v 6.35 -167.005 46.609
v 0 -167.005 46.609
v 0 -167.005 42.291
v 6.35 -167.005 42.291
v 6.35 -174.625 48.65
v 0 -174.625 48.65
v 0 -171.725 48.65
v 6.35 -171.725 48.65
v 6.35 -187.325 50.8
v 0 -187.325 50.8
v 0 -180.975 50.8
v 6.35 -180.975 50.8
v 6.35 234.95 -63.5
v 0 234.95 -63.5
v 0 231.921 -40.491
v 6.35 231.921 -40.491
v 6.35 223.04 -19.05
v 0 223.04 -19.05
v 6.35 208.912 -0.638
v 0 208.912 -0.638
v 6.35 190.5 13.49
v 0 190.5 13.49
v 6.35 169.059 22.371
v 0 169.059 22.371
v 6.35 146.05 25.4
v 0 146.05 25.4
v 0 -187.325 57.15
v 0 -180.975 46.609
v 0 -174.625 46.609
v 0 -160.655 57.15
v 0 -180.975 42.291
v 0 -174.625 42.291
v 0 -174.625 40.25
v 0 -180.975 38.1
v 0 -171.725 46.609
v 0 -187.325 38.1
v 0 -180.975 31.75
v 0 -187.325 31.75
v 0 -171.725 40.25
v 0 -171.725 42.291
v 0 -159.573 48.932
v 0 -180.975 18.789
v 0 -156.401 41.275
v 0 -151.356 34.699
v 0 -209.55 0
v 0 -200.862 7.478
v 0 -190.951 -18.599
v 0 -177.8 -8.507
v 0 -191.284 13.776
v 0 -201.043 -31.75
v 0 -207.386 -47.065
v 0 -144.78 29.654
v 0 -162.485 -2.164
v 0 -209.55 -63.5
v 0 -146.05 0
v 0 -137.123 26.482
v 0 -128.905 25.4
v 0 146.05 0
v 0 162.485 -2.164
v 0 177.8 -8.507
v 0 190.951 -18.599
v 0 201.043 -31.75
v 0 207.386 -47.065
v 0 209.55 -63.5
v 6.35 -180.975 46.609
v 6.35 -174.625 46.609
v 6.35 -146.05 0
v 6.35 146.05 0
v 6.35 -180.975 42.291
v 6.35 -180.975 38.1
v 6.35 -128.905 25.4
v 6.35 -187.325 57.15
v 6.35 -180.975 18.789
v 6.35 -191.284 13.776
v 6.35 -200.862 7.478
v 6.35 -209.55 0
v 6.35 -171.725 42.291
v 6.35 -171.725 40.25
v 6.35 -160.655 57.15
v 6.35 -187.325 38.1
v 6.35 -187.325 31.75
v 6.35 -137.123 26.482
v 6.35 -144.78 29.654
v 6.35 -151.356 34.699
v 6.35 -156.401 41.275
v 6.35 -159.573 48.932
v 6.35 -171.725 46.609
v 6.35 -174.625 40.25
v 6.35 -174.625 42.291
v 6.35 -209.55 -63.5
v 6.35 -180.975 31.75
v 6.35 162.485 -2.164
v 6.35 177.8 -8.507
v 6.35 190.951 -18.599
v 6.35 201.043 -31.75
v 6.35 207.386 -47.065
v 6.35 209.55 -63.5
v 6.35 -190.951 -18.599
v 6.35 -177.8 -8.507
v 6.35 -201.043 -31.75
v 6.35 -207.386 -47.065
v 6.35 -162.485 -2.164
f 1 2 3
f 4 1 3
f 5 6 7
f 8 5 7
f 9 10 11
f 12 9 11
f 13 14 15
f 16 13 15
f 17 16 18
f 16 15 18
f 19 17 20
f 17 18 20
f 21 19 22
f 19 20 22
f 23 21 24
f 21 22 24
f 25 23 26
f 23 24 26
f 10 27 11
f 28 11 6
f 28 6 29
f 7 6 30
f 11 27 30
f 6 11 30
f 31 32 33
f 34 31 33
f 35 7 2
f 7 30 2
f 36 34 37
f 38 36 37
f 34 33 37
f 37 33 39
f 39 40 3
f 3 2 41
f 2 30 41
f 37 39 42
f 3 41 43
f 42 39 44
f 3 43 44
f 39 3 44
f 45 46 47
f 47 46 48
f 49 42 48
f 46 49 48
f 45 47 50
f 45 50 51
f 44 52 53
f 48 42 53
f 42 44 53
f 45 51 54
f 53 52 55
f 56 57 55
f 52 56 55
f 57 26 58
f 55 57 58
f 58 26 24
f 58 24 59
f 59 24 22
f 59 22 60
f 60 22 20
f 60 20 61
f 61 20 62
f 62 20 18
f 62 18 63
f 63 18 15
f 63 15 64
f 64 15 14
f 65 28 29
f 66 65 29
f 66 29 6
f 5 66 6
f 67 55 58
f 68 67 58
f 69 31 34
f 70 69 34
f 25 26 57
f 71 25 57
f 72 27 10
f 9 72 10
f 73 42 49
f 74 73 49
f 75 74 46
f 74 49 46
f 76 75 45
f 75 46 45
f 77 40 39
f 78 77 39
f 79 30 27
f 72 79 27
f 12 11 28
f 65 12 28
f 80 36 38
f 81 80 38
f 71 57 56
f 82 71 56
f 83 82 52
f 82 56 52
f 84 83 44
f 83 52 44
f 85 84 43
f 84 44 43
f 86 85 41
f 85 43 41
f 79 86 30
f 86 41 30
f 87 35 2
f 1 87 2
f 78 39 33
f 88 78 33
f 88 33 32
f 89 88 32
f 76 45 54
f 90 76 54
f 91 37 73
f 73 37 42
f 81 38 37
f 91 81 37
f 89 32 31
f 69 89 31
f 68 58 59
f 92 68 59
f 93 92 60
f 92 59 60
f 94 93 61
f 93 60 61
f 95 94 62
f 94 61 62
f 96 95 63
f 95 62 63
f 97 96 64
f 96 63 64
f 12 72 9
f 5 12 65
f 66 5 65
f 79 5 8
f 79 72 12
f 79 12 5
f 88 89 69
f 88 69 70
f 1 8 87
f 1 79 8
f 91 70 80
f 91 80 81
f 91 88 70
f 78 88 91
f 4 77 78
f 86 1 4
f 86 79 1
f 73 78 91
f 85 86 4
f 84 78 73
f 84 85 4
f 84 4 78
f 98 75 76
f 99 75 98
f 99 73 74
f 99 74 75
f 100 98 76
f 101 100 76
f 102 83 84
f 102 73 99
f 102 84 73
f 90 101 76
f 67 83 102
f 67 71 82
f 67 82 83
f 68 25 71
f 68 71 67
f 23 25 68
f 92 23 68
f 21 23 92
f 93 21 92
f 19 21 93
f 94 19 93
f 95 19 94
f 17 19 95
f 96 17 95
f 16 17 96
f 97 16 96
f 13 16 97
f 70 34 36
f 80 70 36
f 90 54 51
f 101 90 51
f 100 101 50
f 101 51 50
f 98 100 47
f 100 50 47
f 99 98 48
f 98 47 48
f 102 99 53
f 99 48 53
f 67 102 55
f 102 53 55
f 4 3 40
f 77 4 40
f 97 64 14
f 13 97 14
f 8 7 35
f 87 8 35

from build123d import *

# Parameters (mm, degrees)
BOSS_EXTRUDE2_DEPTH = 6.35


with BuildPart() as part:
    # Elevator Ball Support Rail → Boss-Extrude2 (new body)
    with BuildSketch(Plane(origin=(0, 0, 0), x_dir=(0, 0, -1), z_dir=(1, 0, 0))):
        with BuildLine():
            Line((63.5, 209.55), (63.5, 234.95))
            ThreePointArc((63.5, 234.95), (0.638207153, 208.911792847), (-25.4, 146.05))
            Line((-25.4, 146.05), (-25.4, -128.905))
            ThreePointArc((-25.4, -128.905), (-34.699359697, -151.355640303), (-57.15, -160.655))
            Line((-57.15, -160.655), (-57.15, -187.325))
            Line((-57.15, -187.325), (-50.8, -187.325))
            Line((-50.8, -187.325), (-50.8, -180.975))
            Line((-50.8, -180.975), (-46.609, -180.975))
            Line((-46.609, -180.975), (-46.609, -174.625))
            Line((-46.609, -174.625), (-48.649999982, -174.625))
            Line((-48.649999982, -174.625), (-48.649999982, -171.724999958))
            Line((-48.649999982, -171.724999958), (-46.609, -171.724999958))
            Line((-46.609, -171.724999958), (-46.609, -167.005))
            Line((-46.609, -167.005), (-42.291, -167.005))
            Line((-42.291, -167.005), (-42.291, -171.724999958))
            Line((-42.291, -171.724999958), (-40.250000018, -171.724999958))
            Line((-40.250000018, -171.724999958), (-40.250000018, -174.625))
            Line((-40.250000018, -174.625), (-42.291, -174.625))
            Line((-42.291, -174.625), (-42.291, -180.975))
            Line((-42.291, -180.975), (-38.1, -180.975))
            Line((-38.1, -180.975), (-38.1, -187.325))
            Line((-38.1, -187.325), (-31.75, -187.325))
            Line((-31.75, -187.325), (-31.75, -180.975))
            Line((-31.75, -180.975), (-18.788657666, -180.975))
            ThreePointArc((-18.788657666, -180.975), (-10.781328961, -196.174481473), (0, -209.55))
            Line((0, -209.55), (63.5, -209.55))
            ThreePointArc((63.5, -209.55), (18.598719395, -190.951280605), (0, -146.05))
            Line((0, -146.05), (0, 146.05))
            ThreePointArc((0, 146.05), (18.598719395, 190.951280605), (63.5, 209.55))
        make_face()
    extrude(amount=BOSS_EXTRUDE2_DEPTH)


solid = part.part
